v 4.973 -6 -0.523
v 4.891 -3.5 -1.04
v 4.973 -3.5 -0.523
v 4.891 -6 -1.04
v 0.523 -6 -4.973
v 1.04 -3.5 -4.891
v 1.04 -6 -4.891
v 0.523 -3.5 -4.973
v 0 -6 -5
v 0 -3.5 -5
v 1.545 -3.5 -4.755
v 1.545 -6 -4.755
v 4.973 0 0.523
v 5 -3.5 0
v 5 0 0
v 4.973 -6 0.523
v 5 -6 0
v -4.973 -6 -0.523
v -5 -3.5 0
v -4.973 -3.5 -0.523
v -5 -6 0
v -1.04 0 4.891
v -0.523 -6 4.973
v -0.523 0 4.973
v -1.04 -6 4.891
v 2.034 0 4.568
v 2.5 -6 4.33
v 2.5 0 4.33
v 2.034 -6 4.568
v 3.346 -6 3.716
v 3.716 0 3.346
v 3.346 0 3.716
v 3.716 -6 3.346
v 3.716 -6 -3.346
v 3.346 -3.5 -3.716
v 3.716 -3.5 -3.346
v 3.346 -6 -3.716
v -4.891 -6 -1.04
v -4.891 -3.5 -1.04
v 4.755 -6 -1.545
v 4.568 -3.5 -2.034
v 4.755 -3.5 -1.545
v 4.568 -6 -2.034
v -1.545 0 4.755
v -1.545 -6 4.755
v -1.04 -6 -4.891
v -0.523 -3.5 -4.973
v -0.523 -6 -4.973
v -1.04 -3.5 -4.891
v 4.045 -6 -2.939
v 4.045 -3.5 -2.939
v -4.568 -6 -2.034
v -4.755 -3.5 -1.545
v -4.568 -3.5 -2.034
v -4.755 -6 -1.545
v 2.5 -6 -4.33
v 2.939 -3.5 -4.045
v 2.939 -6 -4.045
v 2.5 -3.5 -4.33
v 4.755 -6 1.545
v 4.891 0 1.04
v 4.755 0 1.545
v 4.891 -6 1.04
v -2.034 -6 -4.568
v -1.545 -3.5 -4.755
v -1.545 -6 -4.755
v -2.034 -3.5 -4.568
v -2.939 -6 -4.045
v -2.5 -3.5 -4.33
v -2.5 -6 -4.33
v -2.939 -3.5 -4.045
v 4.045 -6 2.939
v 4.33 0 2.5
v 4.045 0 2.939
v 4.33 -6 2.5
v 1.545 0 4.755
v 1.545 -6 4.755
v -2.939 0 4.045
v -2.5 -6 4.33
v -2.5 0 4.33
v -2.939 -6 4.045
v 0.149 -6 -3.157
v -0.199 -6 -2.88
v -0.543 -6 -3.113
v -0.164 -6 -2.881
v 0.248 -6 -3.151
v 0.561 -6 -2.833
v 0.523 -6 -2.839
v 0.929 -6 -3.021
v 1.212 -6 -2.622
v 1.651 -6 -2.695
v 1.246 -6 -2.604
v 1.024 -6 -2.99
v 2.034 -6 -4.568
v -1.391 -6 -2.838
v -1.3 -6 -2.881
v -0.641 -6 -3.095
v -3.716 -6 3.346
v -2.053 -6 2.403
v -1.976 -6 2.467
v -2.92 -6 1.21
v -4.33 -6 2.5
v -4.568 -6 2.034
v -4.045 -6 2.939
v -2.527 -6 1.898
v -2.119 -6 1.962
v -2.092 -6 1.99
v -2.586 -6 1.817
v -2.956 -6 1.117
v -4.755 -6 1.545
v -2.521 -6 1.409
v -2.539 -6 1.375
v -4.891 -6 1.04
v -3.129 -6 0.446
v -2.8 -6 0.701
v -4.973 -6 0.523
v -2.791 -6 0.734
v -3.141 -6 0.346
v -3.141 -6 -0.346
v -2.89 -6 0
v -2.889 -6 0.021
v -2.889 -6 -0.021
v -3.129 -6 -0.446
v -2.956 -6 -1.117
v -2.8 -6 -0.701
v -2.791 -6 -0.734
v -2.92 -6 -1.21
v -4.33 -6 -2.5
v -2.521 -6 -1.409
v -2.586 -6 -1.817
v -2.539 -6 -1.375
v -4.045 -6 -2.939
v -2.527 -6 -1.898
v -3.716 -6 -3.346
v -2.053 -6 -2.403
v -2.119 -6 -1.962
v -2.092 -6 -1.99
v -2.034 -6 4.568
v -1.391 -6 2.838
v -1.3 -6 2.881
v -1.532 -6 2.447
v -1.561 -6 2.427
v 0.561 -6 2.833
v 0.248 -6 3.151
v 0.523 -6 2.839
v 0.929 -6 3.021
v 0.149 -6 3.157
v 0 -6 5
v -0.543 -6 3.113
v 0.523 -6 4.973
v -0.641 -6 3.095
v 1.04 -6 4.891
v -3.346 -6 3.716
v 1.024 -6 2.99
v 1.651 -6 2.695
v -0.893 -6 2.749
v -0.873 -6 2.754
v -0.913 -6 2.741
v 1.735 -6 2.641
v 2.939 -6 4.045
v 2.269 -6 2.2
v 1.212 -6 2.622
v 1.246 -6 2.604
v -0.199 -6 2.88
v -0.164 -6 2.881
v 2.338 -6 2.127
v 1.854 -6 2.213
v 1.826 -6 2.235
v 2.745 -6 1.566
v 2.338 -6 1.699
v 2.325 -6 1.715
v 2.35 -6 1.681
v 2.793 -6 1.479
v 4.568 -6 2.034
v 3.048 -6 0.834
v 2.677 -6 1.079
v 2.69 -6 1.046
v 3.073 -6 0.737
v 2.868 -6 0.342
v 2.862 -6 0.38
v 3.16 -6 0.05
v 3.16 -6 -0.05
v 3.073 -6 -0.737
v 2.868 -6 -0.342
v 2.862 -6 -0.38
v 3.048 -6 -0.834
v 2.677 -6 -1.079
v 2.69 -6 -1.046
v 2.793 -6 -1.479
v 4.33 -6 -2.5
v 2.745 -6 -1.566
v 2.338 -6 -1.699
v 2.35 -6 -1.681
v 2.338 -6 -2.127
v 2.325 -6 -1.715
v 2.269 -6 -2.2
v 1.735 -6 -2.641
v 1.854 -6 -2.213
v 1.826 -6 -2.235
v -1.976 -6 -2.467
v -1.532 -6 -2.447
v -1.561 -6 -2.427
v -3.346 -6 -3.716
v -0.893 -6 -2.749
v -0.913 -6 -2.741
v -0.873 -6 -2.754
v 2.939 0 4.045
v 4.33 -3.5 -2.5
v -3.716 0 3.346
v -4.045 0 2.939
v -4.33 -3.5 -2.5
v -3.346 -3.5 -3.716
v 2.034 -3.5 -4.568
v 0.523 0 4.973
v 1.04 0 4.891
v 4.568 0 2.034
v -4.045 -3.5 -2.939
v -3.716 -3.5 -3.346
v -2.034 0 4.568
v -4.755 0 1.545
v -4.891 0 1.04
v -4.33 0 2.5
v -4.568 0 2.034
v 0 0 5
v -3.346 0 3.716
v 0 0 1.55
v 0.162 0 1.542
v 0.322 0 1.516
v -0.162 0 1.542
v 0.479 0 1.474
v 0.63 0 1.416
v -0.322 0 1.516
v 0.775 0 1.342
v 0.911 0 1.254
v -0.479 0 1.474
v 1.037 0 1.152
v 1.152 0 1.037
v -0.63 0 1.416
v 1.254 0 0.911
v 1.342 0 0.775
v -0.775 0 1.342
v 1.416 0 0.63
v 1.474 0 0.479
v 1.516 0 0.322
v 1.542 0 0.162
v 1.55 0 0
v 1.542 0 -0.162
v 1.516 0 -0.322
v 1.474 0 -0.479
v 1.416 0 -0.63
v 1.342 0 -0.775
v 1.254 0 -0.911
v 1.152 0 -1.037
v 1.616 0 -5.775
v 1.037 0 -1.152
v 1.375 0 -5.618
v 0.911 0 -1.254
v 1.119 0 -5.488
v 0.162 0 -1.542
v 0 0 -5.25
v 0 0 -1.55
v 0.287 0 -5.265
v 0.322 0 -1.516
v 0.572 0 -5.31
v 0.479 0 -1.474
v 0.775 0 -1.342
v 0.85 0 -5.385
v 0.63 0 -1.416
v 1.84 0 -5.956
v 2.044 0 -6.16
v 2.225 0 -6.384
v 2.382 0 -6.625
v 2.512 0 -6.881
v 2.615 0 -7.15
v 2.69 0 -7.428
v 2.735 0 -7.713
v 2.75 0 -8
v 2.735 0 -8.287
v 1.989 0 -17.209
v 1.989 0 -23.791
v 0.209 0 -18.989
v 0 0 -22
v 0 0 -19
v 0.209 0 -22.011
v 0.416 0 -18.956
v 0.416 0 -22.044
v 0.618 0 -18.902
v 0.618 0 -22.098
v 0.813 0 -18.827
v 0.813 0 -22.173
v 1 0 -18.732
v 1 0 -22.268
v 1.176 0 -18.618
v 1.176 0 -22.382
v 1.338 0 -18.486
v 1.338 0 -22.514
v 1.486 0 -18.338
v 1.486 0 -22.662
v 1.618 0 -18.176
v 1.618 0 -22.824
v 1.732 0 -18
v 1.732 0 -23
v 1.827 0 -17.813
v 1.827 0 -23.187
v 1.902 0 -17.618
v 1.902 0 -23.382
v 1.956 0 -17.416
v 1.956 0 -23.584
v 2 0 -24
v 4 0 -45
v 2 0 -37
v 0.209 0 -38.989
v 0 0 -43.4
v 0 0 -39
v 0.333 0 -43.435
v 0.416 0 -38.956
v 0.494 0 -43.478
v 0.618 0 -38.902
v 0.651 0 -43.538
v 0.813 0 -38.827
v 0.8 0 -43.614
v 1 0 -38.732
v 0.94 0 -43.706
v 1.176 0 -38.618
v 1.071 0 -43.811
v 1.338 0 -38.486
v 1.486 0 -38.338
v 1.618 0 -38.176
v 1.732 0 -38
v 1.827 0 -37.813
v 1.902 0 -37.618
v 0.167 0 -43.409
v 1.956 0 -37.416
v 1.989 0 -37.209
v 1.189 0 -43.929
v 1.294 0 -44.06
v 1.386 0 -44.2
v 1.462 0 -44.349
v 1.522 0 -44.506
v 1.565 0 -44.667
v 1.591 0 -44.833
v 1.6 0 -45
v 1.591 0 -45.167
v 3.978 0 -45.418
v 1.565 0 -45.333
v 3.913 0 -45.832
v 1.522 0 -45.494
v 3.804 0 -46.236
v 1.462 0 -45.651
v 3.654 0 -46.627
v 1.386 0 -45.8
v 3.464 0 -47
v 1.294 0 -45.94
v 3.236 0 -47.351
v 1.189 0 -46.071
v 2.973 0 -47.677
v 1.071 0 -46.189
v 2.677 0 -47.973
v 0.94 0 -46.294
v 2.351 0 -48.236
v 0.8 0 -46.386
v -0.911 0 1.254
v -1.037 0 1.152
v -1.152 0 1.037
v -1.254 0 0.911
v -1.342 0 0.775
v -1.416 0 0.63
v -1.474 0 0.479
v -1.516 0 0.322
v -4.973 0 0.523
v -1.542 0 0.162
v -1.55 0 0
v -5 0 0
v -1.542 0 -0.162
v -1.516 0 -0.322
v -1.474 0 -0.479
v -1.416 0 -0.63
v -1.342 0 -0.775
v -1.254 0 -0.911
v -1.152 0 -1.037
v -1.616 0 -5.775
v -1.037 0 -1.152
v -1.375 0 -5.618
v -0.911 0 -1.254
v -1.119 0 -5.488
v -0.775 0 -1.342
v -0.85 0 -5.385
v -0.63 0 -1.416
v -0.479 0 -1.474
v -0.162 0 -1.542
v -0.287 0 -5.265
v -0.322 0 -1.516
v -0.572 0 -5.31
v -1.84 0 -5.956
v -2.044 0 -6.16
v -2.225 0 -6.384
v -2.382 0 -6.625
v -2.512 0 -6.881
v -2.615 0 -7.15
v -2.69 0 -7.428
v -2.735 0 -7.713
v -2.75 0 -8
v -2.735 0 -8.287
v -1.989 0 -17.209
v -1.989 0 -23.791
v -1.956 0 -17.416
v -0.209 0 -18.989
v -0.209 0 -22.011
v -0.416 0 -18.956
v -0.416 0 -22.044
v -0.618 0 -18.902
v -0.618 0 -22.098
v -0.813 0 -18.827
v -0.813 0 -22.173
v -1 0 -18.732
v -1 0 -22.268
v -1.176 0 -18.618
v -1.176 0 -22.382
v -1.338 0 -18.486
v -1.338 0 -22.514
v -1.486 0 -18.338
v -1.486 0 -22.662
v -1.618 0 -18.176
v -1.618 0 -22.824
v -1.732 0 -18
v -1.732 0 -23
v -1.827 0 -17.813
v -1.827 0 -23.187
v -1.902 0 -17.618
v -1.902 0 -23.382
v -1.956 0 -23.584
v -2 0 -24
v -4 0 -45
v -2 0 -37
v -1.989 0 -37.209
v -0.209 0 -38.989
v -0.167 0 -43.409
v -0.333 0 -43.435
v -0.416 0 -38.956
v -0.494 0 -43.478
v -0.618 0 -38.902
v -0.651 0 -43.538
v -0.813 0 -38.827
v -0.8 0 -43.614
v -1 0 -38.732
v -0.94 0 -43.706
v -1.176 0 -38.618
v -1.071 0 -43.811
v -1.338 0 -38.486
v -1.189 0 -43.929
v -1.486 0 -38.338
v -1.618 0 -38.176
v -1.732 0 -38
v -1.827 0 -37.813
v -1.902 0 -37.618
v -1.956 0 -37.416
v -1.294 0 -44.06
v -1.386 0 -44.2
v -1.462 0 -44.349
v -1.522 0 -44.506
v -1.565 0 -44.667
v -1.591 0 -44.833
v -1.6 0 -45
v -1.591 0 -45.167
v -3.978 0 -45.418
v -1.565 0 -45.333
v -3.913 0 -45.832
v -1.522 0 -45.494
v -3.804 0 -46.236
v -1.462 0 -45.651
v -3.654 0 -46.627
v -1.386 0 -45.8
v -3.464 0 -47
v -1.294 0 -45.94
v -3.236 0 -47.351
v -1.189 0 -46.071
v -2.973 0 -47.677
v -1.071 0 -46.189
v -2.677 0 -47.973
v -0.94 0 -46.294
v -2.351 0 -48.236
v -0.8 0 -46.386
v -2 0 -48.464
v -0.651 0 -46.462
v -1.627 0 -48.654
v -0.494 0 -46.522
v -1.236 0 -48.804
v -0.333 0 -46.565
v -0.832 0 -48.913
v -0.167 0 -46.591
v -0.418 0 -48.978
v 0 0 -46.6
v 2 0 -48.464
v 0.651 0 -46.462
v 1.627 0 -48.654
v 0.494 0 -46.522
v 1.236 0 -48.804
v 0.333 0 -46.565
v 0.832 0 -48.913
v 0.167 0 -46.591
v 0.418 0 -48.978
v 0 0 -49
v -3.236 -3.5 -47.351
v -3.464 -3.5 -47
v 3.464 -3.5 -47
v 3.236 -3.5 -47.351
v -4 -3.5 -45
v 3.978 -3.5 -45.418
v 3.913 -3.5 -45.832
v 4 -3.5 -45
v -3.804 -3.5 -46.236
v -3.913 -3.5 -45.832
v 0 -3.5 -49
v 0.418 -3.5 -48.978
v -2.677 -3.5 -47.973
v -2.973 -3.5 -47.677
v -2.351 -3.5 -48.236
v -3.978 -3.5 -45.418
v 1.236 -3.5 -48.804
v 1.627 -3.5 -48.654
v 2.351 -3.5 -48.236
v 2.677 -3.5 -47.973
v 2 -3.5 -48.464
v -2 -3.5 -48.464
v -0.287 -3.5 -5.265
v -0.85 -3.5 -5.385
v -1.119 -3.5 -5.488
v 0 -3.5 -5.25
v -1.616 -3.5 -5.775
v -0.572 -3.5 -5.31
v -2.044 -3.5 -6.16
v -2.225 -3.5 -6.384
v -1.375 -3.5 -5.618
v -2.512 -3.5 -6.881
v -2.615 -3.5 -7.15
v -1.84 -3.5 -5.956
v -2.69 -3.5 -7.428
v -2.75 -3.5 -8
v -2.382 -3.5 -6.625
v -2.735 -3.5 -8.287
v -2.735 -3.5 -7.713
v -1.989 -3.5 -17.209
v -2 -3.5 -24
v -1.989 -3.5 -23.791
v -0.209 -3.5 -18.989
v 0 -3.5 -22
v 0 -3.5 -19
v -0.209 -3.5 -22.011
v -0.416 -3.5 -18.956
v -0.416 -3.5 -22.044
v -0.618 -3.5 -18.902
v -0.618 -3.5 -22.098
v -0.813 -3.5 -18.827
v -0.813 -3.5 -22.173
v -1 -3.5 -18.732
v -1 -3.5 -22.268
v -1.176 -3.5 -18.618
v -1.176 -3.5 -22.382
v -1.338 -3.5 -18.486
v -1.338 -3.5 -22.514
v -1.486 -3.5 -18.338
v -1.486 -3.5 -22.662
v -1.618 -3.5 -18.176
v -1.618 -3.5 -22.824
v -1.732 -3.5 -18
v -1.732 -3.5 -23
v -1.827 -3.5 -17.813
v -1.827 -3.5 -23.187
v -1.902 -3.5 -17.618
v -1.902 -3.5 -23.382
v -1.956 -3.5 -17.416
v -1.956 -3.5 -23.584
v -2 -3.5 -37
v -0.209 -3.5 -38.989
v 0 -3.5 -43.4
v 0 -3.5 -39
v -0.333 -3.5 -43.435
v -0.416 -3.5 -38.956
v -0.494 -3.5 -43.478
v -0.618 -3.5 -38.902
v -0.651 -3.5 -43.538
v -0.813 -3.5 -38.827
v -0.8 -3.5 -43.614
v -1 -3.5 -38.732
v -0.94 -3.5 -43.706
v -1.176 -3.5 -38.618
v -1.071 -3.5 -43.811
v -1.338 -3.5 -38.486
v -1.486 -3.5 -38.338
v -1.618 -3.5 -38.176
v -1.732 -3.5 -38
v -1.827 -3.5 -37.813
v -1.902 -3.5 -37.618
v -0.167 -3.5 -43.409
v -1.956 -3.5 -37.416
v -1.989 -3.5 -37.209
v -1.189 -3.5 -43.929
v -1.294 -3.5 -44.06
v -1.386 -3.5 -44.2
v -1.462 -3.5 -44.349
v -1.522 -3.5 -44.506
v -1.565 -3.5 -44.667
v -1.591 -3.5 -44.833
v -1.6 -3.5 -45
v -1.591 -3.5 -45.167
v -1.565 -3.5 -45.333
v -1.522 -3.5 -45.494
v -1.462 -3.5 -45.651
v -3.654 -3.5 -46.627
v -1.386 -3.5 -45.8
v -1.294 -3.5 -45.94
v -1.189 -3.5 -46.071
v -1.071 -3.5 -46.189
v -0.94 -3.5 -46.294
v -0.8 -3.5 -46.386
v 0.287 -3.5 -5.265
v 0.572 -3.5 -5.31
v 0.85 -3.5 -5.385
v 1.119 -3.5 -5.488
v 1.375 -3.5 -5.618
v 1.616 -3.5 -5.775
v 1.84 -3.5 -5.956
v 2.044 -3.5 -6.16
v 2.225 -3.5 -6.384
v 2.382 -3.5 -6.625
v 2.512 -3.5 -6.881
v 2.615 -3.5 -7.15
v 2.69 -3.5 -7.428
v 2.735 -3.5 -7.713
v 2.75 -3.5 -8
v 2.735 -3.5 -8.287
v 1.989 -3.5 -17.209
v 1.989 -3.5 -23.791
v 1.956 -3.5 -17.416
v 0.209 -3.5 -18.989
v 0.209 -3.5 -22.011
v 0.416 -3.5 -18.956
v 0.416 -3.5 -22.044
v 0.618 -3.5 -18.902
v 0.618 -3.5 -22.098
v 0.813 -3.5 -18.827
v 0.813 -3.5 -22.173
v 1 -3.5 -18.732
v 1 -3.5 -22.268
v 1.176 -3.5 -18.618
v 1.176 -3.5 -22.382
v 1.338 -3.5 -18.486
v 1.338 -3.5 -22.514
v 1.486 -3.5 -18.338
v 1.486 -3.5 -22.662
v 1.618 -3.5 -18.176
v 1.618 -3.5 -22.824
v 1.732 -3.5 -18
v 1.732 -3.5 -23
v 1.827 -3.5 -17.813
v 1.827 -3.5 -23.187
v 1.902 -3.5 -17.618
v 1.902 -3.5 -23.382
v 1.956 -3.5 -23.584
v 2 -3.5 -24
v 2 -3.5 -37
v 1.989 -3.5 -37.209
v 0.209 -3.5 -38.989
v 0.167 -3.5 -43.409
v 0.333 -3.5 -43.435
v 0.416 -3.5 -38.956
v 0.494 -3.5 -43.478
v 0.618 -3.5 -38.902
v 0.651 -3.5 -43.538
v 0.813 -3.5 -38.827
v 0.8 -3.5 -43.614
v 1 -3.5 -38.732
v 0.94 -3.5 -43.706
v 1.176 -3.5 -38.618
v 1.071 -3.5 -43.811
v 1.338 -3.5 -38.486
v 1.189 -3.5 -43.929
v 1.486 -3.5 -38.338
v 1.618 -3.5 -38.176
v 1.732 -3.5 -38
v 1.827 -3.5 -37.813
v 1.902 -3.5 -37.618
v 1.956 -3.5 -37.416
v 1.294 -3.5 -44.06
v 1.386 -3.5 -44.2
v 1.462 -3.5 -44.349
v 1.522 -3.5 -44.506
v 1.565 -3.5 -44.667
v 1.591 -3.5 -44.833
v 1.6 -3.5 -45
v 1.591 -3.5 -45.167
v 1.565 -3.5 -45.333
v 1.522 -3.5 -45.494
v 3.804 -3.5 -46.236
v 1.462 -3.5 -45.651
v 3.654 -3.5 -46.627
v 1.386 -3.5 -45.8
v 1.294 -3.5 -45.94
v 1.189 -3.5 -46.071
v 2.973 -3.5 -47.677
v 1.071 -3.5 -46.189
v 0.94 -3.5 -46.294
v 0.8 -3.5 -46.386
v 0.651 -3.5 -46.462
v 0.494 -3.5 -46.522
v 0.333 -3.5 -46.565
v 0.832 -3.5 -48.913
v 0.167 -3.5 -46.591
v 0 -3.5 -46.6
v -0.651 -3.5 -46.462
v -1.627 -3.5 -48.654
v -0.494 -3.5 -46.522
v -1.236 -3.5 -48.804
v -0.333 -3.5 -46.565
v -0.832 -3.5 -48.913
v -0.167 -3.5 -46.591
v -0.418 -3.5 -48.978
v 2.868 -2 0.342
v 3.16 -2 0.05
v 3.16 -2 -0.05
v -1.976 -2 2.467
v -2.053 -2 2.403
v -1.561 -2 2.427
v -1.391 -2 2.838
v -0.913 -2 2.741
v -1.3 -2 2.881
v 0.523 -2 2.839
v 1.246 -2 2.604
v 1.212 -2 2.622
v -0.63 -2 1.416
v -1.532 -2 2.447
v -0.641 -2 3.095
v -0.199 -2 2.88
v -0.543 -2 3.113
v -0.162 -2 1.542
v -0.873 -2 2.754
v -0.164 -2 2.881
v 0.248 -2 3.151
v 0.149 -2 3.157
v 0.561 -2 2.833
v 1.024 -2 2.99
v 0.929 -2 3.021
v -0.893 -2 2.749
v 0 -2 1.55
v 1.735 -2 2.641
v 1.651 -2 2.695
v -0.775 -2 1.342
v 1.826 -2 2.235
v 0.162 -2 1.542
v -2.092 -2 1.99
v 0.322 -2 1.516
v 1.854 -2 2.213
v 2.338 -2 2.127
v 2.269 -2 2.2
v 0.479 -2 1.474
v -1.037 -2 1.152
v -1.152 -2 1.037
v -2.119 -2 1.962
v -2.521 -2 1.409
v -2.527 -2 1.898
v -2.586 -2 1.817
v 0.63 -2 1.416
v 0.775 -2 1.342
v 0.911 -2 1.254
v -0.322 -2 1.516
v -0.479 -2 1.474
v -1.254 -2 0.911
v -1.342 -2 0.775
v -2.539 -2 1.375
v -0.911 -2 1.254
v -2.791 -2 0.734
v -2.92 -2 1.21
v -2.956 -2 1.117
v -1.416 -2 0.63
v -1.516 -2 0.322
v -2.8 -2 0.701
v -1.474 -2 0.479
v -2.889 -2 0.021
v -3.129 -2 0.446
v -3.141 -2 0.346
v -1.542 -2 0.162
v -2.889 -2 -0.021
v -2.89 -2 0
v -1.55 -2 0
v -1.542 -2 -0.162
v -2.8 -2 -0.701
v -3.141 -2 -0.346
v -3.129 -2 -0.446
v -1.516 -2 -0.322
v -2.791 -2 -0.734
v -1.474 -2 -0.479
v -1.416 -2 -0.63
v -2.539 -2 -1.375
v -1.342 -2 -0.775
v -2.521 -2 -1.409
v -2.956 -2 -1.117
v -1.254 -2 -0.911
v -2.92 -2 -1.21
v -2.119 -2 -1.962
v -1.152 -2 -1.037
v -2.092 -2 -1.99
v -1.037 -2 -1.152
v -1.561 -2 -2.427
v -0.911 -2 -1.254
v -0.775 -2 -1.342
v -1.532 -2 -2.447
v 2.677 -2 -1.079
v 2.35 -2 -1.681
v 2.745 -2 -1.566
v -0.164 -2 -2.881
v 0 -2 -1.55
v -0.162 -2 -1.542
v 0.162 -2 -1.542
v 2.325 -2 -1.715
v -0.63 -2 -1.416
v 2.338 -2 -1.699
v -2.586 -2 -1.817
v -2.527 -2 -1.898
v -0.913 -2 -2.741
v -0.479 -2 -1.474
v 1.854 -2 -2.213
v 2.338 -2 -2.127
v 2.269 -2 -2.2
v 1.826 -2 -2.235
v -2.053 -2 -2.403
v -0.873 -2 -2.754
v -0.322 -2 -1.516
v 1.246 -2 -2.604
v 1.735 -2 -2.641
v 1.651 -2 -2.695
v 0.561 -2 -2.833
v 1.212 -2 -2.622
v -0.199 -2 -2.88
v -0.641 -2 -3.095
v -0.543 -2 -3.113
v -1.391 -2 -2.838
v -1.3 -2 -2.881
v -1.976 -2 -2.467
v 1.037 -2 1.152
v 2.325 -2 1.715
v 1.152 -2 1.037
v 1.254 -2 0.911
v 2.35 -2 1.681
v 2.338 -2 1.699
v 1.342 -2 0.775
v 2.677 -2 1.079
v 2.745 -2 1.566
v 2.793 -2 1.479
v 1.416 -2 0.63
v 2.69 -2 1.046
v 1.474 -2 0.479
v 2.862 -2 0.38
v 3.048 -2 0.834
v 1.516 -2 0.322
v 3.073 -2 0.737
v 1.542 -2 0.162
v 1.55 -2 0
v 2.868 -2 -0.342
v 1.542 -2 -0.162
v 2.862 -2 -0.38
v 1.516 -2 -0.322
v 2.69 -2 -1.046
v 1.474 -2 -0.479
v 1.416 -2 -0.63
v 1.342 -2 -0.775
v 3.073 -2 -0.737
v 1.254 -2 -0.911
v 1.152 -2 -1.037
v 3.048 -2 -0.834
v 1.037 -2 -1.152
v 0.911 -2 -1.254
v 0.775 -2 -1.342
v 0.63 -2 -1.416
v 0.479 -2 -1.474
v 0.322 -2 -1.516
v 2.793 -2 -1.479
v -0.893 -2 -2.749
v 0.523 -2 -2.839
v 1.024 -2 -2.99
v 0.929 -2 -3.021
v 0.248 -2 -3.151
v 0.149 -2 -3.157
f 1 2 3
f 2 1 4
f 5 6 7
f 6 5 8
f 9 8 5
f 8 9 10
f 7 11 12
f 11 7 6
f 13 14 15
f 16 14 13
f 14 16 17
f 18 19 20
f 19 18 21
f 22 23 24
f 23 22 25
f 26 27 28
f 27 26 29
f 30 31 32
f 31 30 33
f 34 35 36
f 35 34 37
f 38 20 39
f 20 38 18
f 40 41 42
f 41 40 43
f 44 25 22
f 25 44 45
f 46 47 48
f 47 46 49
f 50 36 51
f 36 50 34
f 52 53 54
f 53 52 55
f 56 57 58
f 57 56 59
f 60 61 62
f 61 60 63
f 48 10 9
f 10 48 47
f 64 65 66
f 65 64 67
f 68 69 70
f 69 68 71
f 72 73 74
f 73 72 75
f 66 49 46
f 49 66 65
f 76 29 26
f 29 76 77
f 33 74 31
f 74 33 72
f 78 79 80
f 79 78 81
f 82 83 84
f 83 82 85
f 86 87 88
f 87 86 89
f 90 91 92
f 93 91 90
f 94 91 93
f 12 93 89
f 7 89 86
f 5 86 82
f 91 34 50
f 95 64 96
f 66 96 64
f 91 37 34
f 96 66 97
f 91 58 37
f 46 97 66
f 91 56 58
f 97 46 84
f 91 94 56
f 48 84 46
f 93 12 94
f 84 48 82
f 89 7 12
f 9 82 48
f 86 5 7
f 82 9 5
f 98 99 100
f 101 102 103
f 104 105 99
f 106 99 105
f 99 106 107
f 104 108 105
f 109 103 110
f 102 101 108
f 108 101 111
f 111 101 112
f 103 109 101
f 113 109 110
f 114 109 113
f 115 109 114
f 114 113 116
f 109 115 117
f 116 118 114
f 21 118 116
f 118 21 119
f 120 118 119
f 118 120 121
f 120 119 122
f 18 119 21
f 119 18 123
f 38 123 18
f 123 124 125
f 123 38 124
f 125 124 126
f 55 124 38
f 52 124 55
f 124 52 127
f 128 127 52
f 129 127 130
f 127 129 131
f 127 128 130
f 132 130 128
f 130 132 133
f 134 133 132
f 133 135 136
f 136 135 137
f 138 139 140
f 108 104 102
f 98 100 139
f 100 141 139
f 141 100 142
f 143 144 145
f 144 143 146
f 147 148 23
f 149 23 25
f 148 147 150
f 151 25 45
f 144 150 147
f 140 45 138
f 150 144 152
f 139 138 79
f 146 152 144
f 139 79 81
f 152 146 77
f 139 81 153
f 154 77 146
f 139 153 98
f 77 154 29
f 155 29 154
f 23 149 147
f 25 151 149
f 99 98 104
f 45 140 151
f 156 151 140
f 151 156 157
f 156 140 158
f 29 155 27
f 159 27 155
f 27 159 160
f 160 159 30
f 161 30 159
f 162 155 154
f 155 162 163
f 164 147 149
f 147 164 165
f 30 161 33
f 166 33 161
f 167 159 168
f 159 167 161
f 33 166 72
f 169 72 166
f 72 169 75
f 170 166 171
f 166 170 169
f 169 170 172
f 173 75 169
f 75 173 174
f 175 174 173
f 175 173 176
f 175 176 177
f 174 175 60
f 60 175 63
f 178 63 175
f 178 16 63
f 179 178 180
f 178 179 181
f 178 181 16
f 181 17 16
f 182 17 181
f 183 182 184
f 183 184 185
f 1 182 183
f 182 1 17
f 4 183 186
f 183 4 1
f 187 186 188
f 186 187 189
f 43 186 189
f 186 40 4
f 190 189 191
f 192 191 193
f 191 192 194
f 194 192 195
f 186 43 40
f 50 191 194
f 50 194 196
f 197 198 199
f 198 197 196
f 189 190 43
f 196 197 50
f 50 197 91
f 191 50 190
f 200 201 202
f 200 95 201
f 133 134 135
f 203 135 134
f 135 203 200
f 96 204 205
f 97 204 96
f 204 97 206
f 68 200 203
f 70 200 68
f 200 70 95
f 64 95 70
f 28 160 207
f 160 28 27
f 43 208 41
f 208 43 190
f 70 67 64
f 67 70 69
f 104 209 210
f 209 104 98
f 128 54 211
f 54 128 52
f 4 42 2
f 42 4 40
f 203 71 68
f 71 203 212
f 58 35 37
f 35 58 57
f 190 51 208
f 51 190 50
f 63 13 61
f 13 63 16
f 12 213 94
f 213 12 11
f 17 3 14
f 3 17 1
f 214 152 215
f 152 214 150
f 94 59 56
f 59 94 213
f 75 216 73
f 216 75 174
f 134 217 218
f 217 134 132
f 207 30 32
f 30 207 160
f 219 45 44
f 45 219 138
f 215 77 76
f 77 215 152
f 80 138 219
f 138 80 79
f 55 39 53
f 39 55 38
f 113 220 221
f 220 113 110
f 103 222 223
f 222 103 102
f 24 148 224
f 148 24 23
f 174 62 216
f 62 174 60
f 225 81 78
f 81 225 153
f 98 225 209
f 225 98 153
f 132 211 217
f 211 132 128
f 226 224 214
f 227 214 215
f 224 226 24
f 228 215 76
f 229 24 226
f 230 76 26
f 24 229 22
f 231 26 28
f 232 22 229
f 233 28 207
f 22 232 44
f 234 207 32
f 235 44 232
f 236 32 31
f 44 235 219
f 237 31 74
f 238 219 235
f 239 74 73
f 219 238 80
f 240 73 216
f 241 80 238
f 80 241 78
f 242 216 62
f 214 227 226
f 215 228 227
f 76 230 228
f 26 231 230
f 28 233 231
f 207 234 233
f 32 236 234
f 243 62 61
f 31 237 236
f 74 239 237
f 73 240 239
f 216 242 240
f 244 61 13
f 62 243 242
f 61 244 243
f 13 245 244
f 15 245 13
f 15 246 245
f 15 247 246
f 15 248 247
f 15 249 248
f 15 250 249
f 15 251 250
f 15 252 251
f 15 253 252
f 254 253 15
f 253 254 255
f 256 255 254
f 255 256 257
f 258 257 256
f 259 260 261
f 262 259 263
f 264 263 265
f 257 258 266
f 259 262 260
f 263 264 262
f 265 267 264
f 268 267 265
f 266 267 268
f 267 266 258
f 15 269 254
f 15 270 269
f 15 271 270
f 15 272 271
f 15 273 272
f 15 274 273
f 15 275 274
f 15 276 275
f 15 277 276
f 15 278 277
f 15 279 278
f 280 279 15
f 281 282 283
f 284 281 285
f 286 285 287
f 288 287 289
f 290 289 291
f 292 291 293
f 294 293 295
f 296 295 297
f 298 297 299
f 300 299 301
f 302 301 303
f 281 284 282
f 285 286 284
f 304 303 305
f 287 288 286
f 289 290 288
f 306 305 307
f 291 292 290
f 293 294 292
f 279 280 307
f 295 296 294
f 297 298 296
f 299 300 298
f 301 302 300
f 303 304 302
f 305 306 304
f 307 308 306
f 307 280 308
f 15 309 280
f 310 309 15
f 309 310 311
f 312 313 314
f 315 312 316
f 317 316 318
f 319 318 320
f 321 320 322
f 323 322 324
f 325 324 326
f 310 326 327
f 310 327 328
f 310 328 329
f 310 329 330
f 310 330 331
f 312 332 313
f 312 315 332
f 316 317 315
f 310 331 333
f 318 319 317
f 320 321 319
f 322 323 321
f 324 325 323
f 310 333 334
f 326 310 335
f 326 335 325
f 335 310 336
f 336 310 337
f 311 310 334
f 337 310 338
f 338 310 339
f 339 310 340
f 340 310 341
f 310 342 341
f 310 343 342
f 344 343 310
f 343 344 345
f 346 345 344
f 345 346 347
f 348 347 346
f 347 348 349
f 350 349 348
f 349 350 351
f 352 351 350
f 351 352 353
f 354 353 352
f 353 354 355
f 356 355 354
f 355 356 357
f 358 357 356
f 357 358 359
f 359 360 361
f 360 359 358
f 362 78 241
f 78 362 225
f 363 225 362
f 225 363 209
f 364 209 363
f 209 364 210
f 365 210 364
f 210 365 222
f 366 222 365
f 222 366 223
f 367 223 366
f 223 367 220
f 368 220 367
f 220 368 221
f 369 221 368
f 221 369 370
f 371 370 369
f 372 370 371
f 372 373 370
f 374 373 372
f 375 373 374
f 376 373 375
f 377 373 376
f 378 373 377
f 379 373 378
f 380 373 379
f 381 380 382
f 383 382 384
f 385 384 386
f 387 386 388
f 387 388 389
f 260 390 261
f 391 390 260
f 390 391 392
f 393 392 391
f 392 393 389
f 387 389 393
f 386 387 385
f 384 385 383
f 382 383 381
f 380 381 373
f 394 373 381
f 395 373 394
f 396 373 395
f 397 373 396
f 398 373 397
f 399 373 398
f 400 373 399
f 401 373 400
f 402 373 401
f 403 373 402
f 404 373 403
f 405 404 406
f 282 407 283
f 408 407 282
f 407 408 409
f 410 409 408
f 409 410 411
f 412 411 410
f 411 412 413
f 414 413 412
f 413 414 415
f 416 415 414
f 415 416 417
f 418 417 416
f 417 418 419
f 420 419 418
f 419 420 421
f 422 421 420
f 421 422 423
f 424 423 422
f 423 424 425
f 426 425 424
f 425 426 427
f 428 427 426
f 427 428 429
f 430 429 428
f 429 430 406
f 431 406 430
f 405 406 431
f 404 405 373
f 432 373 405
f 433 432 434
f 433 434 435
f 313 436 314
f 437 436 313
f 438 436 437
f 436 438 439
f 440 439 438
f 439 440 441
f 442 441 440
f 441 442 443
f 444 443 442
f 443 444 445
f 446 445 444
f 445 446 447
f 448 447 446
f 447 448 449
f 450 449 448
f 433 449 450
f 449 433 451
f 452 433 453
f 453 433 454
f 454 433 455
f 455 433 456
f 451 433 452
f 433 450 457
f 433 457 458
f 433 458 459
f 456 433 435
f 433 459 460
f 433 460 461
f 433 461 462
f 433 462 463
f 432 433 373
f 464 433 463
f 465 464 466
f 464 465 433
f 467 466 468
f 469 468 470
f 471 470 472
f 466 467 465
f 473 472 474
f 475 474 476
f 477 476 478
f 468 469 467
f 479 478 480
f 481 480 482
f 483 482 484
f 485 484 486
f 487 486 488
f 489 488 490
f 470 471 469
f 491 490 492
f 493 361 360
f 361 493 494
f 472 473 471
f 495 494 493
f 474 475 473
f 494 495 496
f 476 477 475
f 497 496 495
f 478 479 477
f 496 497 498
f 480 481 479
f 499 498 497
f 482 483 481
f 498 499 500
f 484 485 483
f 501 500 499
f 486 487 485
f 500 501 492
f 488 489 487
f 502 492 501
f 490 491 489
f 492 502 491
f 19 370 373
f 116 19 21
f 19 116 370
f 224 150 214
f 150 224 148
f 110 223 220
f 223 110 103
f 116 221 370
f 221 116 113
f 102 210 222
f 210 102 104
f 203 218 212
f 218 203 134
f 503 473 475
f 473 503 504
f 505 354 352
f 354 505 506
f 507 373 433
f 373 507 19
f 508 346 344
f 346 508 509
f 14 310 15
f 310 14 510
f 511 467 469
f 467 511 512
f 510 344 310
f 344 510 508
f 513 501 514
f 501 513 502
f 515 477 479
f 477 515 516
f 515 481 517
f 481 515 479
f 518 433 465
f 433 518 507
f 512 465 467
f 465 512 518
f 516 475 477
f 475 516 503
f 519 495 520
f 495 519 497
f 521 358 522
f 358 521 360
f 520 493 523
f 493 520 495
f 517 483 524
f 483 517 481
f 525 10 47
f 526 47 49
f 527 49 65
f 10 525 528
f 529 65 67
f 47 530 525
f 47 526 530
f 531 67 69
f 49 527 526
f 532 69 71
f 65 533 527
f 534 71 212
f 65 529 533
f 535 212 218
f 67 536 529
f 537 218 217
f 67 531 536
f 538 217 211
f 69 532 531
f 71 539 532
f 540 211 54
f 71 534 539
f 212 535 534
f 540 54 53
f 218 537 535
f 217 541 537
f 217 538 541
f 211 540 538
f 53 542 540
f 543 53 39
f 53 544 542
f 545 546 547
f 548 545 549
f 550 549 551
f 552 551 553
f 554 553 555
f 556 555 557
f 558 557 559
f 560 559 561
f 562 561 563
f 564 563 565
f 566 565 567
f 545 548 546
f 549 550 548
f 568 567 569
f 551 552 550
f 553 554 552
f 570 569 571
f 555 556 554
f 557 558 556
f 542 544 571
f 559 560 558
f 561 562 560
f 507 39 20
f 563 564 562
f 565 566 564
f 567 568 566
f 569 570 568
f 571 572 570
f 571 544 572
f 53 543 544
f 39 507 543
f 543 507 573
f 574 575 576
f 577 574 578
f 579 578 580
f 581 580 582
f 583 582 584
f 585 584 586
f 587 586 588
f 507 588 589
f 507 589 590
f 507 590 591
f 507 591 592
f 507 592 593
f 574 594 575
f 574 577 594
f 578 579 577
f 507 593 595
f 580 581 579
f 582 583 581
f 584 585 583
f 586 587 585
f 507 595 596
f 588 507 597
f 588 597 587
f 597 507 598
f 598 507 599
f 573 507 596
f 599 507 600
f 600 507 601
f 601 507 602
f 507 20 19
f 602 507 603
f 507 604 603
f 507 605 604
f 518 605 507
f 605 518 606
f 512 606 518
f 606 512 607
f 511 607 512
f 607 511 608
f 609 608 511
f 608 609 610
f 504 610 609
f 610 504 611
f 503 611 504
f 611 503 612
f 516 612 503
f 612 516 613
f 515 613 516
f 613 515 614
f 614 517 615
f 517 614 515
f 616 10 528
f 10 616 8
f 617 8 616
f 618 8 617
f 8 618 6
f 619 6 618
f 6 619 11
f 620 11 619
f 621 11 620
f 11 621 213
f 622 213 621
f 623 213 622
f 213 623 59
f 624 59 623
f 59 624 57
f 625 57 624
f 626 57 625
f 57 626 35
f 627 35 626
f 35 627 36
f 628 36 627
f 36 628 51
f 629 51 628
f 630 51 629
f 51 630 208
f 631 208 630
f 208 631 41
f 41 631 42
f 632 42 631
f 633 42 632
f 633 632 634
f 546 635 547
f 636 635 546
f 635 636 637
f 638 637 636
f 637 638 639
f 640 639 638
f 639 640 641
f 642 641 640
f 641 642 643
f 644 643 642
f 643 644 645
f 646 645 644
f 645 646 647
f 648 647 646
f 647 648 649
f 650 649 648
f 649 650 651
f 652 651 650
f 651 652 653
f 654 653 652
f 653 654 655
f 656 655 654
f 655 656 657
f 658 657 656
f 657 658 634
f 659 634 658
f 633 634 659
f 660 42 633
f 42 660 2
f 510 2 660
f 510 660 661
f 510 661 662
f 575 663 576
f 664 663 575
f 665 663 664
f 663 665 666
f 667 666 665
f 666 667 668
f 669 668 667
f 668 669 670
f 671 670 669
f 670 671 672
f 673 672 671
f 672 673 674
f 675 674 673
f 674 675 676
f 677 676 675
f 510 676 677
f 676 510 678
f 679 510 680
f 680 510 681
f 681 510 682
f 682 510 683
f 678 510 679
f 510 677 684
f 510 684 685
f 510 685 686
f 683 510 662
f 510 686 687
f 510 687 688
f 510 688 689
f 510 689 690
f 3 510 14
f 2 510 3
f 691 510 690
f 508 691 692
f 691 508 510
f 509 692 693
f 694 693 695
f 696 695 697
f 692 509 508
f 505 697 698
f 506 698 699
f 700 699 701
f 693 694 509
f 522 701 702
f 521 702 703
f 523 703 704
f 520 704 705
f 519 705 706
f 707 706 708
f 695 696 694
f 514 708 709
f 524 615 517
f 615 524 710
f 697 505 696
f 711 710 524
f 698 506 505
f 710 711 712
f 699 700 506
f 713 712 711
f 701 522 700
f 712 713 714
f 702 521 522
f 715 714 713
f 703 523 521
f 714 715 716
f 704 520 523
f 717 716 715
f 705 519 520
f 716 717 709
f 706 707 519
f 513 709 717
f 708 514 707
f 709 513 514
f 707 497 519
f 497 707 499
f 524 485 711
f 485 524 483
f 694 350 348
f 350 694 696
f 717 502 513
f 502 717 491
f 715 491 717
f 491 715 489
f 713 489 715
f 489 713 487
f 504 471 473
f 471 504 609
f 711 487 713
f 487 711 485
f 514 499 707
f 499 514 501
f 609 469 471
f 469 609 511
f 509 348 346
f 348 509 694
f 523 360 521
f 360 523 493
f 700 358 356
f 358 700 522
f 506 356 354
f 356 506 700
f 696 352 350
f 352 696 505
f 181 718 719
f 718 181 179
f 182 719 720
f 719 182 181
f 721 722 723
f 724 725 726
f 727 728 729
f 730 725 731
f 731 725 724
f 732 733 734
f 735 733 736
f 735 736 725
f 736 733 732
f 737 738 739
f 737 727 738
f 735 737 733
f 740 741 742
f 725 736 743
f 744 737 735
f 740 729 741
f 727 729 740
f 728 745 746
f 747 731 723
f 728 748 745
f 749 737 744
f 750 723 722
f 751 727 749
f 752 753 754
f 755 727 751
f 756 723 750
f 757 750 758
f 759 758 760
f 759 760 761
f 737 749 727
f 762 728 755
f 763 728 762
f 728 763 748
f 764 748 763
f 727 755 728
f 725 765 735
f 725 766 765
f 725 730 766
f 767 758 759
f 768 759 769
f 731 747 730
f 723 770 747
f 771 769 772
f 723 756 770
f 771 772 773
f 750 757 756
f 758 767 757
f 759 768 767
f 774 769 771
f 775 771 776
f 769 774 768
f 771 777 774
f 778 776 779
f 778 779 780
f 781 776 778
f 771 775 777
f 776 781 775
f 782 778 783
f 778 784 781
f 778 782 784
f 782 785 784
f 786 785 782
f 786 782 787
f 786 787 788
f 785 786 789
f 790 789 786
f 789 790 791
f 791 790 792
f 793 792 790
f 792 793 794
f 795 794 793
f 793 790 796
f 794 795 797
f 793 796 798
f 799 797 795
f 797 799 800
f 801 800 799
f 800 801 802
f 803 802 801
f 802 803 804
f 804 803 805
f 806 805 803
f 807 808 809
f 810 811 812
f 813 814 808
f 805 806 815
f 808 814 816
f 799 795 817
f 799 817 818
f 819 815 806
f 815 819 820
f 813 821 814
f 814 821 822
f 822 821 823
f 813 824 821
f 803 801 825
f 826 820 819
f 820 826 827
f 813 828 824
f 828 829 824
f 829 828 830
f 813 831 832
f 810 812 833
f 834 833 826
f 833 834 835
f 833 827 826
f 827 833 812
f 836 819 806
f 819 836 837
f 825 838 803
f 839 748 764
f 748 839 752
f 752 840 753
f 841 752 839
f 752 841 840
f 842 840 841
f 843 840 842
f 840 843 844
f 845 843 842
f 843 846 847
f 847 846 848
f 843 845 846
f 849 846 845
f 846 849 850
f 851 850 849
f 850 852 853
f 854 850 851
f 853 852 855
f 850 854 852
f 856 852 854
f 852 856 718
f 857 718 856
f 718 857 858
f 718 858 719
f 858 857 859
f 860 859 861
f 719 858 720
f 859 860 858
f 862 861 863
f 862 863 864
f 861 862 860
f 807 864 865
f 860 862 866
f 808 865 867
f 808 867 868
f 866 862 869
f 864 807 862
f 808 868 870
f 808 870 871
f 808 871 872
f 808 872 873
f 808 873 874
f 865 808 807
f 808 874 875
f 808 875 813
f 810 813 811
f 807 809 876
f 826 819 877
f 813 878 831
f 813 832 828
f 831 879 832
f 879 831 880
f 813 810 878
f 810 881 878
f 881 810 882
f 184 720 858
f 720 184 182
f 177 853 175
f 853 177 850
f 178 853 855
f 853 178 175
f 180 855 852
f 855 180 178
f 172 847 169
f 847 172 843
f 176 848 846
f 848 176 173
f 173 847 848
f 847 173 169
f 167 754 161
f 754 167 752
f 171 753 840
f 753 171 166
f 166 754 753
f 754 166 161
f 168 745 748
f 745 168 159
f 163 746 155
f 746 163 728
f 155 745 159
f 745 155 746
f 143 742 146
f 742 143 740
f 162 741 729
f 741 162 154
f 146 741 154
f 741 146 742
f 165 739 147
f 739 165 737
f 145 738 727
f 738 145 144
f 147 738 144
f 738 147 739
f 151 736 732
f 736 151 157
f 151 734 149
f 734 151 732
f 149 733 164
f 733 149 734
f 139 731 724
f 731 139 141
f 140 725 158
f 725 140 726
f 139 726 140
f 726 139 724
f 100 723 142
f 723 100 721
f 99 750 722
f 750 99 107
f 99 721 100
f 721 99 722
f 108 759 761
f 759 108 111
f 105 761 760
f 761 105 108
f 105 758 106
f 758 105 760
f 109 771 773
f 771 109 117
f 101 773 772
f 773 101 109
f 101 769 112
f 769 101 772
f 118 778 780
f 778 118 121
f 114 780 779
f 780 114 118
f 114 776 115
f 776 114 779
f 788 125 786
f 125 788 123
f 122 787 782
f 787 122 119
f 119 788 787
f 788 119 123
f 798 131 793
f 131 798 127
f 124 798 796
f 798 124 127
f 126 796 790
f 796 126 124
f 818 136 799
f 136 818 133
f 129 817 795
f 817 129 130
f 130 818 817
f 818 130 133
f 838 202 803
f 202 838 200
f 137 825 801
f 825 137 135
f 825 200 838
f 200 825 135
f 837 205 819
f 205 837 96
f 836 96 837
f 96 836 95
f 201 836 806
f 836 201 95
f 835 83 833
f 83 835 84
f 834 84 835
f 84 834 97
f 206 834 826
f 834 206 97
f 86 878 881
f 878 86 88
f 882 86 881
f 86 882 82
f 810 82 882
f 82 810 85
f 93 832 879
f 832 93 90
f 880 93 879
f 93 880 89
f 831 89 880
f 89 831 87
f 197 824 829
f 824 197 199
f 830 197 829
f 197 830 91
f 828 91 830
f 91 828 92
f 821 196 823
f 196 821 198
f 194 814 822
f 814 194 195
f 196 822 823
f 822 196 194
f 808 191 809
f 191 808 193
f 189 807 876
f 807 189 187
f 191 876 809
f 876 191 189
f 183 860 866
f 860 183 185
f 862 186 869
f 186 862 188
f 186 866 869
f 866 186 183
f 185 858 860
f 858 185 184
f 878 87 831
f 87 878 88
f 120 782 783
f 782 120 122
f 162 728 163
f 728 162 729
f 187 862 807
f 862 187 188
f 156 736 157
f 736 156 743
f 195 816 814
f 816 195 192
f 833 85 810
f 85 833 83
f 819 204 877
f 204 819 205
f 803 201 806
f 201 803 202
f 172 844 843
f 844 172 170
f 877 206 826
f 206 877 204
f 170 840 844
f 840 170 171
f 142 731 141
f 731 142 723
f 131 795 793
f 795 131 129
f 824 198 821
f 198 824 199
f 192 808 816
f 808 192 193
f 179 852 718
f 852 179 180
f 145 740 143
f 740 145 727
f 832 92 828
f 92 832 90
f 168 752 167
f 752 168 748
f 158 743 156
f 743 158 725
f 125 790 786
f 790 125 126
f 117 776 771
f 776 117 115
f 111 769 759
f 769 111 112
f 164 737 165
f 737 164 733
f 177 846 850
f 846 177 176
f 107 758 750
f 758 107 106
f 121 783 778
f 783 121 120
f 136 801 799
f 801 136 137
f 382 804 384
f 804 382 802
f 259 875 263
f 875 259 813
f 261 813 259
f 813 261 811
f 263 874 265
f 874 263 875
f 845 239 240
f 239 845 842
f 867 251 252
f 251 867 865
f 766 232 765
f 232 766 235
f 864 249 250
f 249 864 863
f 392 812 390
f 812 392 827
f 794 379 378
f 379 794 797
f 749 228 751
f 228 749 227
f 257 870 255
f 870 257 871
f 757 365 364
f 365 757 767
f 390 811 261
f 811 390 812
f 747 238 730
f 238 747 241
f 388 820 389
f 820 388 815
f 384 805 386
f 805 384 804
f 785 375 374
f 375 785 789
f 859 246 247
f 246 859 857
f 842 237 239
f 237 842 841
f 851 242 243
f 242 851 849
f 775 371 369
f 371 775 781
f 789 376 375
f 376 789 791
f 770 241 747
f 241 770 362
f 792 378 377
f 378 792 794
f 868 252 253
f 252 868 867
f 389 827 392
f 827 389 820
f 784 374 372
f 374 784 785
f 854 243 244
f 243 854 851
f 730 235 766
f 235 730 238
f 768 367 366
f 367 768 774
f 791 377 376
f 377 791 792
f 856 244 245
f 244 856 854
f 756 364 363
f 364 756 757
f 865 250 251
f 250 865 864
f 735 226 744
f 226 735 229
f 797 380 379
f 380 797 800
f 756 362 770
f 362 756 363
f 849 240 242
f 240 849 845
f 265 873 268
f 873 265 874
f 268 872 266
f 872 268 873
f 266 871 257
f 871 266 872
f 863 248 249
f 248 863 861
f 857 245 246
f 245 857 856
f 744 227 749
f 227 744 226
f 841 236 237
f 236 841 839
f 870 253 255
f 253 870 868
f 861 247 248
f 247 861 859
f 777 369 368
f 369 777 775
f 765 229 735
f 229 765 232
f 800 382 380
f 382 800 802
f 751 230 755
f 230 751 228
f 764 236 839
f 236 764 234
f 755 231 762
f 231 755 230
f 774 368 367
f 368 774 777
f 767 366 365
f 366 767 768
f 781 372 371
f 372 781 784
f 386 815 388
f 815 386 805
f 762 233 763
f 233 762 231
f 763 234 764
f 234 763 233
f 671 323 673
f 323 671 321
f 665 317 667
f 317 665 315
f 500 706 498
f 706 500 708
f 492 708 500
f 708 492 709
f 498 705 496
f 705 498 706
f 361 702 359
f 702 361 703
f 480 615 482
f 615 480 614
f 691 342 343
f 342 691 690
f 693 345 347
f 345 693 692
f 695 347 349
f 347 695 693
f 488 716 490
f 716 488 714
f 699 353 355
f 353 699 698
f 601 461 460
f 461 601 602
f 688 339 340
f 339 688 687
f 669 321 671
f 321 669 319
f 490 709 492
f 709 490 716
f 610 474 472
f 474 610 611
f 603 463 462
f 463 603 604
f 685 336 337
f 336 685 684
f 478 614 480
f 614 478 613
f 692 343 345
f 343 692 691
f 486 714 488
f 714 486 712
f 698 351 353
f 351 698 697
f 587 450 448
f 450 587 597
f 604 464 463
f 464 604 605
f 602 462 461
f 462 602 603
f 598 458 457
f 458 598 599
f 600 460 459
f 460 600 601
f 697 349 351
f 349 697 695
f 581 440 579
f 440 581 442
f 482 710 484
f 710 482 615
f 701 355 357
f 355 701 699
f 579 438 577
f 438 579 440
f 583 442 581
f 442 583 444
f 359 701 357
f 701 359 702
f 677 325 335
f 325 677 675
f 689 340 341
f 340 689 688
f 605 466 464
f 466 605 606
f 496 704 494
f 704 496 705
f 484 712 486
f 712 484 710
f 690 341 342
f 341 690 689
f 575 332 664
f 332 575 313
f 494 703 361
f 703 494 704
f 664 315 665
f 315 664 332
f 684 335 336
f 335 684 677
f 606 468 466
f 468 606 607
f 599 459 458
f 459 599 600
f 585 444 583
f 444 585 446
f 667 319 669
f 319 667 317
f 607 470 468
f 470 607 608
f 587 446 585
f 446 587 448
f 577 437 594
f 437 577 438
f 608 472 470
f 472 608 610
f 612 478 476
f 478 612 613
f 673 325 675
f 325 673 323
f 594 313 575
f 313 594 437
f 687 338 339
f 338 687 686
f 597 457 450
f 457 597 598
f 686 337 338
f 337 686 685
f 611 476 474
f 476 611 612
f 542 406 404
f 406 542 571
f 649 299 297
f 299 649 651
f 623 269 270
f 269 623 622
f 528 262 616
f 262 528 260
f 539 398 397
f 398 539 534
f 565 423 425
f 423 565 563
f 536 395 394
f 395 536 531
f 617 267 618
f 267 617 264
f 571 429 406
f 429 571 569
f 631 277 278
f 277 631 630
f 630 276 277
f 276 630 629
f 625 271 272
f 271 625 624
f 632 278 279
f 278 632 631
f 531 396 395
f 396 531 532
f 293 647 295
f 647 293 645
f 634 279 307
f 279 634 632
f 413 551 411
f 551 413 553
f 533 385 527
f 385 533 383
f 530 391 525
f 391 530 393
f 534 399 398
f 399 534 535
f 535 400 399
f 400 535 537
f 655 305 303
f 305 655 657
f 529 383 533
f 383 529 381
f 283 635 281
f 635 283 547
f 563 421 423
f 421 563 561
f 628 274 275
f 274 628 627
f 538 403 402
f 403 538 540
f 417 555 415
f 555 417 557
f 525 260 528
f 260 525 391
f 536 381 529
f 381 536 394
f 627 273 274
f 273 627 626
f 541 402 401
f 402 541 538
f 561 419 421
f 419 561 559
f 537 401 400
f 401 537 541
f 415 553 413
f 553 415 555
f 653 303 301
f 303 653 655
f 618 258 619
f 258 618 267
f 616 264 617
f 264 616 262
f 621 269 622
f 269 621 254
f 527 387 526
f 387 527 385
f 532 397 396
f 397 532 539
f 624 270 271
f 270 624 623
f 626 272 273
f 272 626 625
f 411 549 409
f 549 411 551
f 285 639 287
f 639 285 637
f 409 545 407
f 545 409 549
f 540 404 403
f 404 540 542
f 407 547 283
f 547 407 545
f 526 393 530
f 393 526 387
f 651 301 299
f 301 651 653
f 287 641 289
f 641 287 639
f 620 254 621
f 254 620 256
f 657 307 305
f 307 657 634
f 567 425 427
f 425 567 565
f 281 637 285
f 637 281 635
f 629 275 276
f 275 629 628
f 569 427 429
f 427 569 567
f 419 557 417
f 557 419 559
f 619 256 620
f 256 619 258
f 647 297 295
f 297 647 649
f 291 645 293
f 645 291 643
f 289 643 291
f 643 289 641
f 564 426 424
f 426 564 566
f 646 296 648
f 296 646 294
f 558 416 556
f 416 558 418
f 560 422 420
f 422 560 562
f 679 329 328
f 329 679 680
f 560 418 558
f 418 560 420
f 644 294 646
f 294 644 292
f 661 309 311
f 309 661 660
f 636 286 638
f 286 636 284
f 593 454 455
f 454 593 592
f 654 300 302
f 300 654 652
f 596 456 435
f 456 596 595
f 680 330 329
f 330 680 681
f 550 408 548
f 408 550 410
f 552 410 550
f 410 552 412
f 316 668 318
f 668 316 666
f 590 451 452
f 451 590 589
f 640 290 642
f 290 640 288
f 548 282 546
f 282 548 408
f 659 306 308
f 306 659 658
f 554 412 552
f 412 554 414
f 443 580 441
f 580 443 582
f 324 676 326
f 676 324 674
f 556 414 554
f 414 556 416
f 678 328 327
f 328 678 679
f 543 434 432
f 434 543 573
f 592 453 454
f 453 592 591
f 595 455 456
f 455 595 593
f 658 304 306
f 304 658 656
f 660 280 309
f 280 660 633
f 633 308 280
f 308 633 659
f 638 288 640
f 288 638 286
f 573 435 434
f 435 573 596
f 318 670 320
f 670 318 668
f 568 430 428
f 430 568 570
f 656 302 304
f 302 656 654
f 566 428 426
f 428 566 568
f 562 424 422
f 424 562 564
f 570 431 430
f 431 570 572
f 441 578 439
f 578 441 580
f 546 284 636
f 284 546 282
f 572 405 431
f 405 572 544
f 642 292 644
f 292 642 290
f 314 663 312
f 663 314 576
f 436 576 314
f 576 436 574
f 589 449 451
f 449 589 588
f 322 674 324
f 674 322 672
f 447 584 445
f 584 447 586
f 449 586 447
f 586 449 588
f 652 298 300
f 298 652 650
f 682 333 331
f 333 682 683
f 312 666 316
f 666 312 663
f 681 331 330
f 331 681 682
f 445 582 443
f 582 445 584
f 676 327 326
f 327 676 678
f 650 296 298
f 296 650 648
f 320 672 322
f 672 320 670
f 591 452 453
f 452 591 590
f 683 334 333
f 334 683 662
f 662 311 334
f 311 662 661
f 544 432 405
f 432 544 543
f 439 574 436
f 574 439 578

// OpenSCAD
// file: servo_toothed_head.scad
/**
 *  Parametric servo arm generator for OpenScad
 *  Générateur de palonnier de servo pour OpenScad
 *
 *  Copyright (c) 2012 Charles Rincheval.  All rights reserved.
 *
 *  This library is free software; you can redistribute it and/or
 *  modify it under the terms of the GNU Lesser General Public
 *  License as published by the Free Software Foundation; either
 *  version 2.1 of the License, or (at your option) any later version.
 *
 *  This library is distributed in the hope that it will be useful,
 *  but WITHOUT ANY WARRANTY; without even the implied warranty of
 *  MERCHANTABILITY or FITNESS FOR A PARTICULAR PURPOSE.  See the GNU
 *  Lesser General Public License for more details.
 *
 *  You should have received a copy of the GNU Lesser General Public
 *  License along with this library; if not, write to the Free Software
 *  Foundation, Inc., 51 Franklin St, Fifth Floor, Boston, MA  02110-1301  USA
 *
 *  Last update :
 *  https://github.com/hugokernel/OpenSCAD_ServoArms
 *
 *  http://www.digitalspirit.org/
 */

arm_length = 30;

arm_count = 1; // [1,2,3,4,5,6,7,8]

//  Clear between arm head and servo head (PLA: 0.3, ABS 0.2)
SERVO_HEAD_CLEAR = 0.2; // [0.2,0.3,0.4,0.5]

$fn = 40 / 1;

/**
 *  Head / Tooth parameters
 *  Futaba 3F Standard Spline
 *  http://www.servocity.com/html/futaba_servo_splines.html
 *
 *  First array (head related) :
 *  0. Head external diameter
 *  1. Head heigth
 *  2. Head thickness
 *  3. Head screw diameter
 *
 *  Second array (tooth related) :
 *  0. Tooth count
 *  1. Tooth height
 *  2. Tooth length
 *  3. Tooth width
 */
FUTABA_3F_SPLINE = [
    [5.92, 4, 1.1, 2.5],
    [25, 0.3, 0.7, 0.1]
];

module servo_futaba_3f(length, count) {
    servo_arm(FUTABA_3F_SPLINE, [length, count]);
}

/**
 *  If you want to support a new servo, juste add a new spline definition array
 *  and a module named like servo_XXX_YYY where XXX is servo brand and YYY is the
 *  connection type (3f) or the servo type (s3003)
 */

module servo_standard(length, count) {
    servo_futaba_3f(length, count);
}

/**
 *  Tooth
 *
 *    |<-w->|
 *    |_____|___
 *    /     \  ^h
 *  _/       \_v
 *   |<--l-->|
 *
 *  - tooth length (l)
 *  - tooth width (w)
 *  - tooth height (h)
 *  - height
 *
 */
module servo_head_tooth(length, width, height, head_height) {
    linear_extrude(height = head_height) {
        polygon([[-length / 2, 0], [-width / 2, height], [width / 2, height], [length / 2,0]]);
    }
}

/**
 *  Servo head
 */
module servo_head(params, clear = SERVO_HEAD_CLEAR) {

    head = params[0];
    tooth = params[1];

    head_diameter = head[0];
    head_heigth = head[1];

    tooth_count = tooth[0];
    tooth_height = tooth[1];
    tooth_length = tooth[2];
    tooth_width = tooth[3];


    cylinder(r = head_diameter / 2 - tooth_height + 0.03 + clear, h = head_heigth);

    for (i = [0 : tooth_count]) {
        rotate([0, 0, i * (360 / tooth_count)]) {
            translate([0, head_diameter / 2 - tooth_height + clear, 0]) {
                servo_head_tooth(tooth_length, tooth_width, tooth_height, head_heigth);
            }
        }
    }
}

/**
 *  Servo hold
 *  - Head / Tooth parameters
 *  - Arms params (length and count)
 */
module servo_arm(params, arms) {

    head = params[0];
    tooth = params[1];

    head_diameter = head[0];
    head_heigth = head[1];
    head_thickness = head[2];
    head_screw_diameter = head[3];

    tooth_length = tooth[2];
    tooth_width = tooth[3];

    arm_length = arms[0];
    arm_count = arms[1];


servo_head(params);
}

module servo_toothed_head() {
  translate([0,0,0])
        servo_standard(arm_length, arm_count);
}

//servo_toothed_head();
// main file
include <servo_toothed_head.scad>

module shoulder_arm(){
height = 3.5;
length=45;
$fn=60;
difference(){
union(){
    translate([0,0,0])cylinder(d=10,h=6);

hull(){
translate([0,0,0])cylinder(d=10,h=height);
translate([length,0,0])cylinder(d=8,h=height);
}
}
translate([0,0,2])servo_toothed_head();
translate([0,0,-1])cylinder(d=3.1,h=height*5); // hole for servo
translate([length,0,-1])cylinder(d=3.2,h=height*5); // hole m3


hull(){
translate([8,0,-1])cylinder(d=5.5,h=height*3);
translate([17,0,-1])cylinder(d=4,h=height*3);
  }
hull(){
translate([24,0,-1])cylinder(d=4,h=height*3);
translate([37,0,-1])cylinder(d=4,h=height*3);
  }
}
}

module shoulder_for_mujoco(){
  rotate([90,90,180])shoulder_arm();  
  }
  module shoulder_right_for_mujoco(){
  rotate([0,0,180])shoulder_for_mujoco();
  }
//shoulder_right_for_mujoco();

//translate([length,0,0])cylinder(d=1,h=height);
  
  shoulder_right_for_mujoco();
